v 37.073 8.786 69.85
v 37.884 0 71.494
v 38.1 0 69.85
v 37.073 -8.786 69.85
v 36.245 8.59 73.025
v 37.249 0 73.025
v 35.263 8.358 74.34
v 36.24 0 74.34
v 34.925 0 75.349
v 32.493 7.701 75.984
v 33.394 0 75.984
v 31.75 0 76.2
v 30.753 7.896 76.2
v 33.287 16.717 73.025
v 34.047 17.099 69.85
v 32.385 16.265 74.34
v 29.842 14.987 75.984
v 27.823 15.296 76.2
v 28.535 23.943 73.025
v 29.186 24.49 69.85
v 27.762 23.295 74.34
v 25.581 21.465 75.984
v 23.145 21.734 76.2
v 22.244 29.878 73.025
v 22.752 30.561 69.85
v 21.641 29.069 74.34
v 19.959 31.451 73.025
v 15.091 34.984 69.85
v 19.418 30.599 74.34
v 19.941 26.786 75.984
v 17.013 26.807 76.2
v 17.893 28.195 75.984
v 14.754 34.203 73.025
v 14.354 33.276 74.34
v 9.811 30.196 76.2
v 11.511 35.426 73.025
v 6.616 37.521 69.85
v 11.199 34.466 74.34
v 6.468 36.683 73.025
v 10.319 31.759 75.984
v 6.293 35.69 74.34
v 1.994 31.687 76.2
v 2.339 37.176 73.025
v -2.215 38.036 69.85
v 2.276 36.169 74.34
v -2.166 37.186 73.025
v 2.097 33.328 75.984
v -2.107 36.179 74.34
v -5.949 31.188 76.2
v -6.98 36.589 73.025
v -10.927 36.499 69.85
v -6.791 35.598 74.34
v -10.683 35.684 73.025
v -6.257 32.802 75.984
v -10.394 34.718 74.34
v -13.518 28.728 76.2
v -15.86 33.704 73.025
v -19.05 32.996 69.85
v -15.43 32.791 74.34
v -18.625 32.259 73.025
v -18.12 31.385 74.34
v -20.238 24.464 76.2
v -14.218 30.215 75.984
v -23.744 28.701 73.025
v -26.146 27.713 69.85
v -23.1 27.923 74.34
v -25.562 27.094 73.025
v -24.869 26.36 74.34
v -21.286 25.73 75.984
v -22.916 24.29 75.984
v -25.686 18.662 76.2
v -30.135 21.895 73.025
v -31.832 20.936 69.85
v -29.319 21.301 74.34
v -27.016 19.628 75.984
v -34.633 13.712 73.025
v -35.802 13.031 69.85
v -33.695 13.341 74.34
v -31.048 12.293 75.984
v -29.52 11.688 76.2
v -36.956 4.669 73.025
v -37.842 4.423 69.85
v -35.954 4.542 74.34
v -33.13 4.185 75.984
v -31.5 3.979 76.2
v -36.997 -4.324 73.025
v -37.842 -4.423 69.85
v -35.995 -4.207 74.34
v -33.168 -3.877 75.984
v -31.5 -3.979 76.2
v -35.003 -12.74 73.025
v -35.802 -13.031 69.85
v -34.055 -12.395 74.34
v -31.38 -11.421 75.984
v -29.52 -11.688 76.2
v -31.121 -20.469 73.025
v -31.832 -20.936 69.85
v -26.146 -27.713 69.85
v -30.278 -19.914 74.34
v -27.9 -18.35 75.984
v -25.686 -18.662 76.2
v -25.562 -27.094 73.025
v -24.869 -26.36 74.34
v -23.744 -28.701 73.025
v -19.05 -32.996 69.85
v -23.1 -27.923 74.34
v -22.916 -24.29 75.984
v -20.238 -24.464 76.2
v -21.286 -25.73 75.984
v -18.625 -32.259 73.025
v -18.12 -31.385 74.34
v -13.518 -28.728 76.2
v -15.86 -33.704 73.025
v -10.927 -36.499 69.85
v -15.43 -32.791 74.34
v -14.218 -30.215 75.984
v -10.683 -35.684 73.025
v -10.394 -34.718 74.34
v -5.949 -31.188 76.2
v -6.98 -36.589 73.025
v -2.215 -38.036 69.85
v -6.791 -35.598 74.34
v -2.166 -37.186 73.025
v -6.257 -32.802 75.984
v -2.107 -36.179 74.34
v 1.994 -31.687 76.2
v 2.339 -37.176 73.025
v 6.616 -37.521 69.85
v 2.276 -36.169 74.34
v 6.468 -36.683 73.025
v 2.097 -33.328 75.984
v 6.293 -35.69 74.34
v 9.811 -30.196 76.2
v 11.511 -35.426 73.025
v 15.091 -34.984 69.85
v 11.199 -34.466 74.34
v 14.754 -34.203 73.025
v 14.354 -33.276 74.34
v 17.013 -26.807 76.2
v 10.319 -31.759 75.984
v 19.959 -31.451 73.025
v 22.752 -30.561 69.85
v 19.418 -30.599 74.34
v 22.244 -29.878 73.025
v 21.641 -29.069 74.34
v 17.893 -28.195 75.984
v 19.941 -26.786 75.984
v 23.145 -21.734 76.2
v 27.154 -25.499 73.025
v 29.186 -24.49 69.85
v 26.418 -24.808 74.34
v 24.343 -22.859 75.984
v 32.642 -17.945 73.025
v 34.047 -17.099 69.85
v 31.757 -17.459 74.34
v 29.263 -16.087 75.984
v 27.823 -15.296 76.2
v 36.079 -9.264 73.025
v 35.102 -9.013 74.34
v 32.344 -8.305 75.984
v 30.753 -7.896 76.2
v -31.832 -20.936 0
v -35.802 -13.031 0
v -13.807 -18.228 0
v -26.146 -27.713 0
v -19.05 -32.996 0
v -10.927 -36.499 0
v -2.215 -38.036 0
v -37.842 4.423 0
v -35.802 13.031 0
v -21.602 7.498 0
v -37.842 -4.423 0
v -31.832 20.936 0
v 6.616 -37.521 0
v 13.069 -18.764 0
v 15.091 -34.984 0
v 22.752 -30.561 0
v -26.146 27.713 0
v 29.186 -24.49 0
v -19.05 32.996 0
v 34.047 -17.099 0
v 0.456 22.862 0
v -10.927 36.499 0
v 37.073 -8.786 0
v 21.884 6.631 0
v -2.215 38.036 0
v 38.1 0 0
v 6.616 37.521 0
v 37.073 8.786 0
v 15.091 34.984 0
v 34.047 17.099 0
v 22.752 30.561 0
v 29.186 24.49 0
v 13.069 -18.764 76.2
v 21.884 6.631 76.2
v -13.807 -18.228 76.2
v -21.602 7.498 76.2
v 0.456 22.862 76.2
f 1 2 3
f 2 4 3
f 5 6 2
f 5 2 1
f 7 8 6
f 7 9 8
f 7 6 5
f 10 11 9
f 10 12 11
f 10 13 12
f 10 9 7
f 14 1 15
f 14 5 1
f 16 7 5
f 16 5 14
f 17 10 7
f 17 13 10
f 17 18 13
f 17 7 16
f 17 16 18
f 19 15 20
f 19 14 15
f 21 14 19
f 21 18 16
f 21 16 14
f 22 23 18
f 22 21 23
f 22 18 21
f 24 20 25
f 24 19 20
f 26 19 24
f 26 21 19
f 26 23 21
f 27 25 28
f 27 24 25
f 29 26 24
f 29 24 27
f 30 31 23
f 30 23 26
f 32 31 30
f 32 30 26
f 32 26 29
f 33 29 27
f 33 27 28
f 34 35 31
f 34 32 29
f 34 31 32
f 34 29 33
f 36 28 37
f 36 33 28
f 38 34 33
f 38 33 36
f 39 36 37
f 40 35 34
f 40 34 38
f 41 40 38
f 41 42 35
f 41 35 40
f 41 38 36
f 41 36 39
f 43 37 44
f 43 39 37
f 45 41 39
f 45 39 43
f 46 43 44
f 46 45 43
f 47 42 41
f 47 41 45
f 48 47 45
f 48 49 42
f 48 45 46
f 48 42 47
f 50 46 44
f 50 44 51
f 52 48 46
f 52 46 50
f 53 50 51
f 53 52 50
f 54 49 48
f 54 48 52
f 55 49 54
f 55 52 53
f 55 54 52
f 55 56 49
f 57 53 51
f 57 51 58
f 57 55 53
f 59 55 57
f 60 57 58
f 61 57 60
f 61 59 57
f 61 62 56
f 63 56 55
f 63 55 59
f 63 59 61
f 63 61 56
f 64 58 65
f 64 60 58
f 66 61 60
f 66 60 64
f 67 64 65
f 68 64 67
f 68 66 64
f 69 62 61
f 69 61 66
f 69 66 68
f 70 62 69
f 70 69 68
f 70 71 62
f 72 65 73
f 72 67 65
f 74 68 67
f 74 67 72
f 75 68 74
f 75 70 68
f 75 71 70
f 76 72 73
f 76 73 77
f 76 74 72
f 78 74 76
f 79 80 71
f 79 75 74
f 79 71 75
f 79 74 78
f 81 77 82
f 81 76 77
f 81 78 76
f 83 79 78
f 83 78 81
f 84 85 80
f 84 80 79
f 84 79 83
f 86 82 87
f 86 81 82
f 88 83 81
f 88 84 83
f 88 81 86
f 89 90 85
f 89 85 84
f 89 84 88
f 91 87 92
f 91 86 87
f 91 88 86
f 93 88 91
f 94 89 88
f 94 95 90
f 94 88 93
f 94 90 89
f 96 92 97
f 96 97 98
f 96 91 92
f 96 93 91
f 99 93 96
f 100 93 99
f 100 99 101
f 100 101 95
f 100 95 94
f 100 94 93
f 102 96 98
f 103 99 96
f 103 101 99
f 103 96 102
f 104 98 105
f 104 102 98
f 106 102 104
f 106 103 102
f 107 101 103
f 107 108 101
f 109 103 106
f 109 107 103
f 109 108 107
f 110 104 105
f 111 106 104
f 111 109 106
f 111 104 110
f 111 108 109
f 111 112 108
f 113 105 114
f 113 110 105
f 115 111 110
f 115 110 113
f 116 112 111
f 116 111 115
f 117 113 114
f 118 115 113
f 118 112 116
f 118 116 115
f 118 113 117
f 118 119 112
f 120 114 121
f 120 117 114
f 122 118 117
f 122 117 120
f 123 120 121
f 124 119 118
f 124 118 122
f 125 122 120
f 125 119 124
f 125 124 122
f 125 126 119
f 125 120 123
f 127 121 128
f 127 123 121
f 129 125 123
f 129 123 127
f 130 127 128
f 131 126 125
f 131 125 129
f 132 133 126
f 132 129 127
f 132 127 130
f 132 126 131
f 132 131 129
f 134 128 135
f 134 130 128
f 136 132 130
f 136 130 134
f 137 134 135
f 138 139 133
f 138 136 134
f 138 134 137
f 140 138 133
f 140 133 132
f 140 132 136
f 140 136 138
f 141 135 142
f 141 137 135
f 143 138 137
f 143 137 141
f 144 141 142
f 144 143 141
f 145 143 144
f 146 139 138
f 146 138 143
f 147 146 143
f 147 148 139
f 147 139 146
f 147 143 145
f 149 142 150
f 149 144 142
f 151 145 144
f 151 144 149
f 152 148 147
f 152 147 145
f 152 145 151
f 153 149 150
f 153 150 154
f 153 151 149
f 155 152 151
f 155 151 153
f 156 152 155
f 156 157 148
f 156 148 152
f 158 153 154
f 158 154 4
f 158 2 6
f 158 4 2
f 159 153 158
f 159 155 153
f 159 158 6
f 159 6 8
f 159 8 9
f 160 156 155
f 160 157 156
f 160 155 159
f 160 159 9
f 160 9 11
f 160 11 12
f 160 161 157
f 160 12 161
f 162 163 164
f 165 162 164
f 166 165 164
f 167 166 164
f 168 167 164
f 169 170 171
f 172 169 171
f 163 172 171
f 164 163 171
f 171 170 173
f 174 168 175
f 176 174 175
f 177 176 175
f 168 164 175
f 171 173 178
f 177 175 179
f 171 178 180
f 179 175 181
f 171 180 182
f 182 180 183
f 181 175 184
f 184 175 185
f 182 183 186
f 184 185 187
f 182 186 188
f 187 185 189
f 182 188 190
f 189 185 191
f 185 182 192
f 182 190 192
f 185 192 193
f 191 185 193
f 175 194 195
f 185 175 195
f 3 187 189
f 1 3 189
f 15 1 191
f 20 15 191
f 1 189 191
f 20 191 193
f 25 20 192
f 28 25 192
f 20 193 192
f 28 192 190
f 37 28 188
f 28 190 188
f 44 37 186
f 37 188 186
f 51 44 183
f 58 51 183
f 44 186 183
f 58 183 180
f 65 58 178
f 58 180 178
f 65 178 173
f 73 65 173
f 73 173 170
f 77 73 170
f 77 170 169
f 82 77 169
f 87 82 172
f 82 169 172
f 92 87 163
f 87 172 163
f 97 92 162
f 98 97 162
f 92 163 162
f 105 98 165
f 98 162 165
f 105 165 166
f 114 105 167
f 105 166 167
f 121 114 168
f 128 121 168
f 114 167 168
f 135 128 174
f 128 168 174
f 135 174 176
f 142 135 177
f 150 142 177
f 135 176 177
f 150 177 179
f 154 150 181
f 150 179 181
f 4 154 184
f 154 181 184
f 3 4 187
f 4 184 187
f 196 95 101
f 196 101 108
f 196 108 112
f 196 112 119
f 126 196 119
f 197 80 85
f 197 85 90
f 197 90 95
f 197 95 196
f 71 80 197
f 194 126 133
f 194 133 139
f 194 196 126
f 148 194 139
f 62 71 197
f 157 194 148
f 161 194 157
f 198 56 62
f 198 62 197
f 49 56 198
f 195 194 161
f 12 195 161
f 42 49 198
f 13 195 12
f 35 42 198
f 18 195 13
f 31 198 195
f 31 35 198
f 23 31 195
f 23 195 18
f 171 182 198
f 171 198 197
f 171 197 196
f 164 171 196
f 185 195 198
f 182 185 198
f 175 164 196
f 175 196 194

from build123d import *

# Parameters (mm, degrees)
F0_R     = 38.1
F1_DEPTH = 76.2
F3_DEPTH = 76.201
F4_R     = 6.35


with BuildPart() as f1:
    # F0 (on Top) → F1 (new body)
    with BuildSketch(Plane.XY):
        Circle(F0_R)
    extrude(amount=F1_DEPTH)

    # F2 (on face) → F3 (cut, through all)
    with BuildSketch(Plane.XY.offset(76.2)):
        Polygon((0.456082, 22.861894), (-21.602016, 7.498473), (-13.806862, -18.227582), (13.068906, -18.763739), (21.88389, 6.630954), align=None)
    extrude(amount=-F3_DEPTH, mode=Mode.SUBTRACT)

    # F4
    f4_edges = [f1.edges().sort_by_distance(p)[0] for p in [
        (-38.1, 0, 76.2),
    ]]
    fillet(f4_edges, radius=F4_R)


solid = f1.part
